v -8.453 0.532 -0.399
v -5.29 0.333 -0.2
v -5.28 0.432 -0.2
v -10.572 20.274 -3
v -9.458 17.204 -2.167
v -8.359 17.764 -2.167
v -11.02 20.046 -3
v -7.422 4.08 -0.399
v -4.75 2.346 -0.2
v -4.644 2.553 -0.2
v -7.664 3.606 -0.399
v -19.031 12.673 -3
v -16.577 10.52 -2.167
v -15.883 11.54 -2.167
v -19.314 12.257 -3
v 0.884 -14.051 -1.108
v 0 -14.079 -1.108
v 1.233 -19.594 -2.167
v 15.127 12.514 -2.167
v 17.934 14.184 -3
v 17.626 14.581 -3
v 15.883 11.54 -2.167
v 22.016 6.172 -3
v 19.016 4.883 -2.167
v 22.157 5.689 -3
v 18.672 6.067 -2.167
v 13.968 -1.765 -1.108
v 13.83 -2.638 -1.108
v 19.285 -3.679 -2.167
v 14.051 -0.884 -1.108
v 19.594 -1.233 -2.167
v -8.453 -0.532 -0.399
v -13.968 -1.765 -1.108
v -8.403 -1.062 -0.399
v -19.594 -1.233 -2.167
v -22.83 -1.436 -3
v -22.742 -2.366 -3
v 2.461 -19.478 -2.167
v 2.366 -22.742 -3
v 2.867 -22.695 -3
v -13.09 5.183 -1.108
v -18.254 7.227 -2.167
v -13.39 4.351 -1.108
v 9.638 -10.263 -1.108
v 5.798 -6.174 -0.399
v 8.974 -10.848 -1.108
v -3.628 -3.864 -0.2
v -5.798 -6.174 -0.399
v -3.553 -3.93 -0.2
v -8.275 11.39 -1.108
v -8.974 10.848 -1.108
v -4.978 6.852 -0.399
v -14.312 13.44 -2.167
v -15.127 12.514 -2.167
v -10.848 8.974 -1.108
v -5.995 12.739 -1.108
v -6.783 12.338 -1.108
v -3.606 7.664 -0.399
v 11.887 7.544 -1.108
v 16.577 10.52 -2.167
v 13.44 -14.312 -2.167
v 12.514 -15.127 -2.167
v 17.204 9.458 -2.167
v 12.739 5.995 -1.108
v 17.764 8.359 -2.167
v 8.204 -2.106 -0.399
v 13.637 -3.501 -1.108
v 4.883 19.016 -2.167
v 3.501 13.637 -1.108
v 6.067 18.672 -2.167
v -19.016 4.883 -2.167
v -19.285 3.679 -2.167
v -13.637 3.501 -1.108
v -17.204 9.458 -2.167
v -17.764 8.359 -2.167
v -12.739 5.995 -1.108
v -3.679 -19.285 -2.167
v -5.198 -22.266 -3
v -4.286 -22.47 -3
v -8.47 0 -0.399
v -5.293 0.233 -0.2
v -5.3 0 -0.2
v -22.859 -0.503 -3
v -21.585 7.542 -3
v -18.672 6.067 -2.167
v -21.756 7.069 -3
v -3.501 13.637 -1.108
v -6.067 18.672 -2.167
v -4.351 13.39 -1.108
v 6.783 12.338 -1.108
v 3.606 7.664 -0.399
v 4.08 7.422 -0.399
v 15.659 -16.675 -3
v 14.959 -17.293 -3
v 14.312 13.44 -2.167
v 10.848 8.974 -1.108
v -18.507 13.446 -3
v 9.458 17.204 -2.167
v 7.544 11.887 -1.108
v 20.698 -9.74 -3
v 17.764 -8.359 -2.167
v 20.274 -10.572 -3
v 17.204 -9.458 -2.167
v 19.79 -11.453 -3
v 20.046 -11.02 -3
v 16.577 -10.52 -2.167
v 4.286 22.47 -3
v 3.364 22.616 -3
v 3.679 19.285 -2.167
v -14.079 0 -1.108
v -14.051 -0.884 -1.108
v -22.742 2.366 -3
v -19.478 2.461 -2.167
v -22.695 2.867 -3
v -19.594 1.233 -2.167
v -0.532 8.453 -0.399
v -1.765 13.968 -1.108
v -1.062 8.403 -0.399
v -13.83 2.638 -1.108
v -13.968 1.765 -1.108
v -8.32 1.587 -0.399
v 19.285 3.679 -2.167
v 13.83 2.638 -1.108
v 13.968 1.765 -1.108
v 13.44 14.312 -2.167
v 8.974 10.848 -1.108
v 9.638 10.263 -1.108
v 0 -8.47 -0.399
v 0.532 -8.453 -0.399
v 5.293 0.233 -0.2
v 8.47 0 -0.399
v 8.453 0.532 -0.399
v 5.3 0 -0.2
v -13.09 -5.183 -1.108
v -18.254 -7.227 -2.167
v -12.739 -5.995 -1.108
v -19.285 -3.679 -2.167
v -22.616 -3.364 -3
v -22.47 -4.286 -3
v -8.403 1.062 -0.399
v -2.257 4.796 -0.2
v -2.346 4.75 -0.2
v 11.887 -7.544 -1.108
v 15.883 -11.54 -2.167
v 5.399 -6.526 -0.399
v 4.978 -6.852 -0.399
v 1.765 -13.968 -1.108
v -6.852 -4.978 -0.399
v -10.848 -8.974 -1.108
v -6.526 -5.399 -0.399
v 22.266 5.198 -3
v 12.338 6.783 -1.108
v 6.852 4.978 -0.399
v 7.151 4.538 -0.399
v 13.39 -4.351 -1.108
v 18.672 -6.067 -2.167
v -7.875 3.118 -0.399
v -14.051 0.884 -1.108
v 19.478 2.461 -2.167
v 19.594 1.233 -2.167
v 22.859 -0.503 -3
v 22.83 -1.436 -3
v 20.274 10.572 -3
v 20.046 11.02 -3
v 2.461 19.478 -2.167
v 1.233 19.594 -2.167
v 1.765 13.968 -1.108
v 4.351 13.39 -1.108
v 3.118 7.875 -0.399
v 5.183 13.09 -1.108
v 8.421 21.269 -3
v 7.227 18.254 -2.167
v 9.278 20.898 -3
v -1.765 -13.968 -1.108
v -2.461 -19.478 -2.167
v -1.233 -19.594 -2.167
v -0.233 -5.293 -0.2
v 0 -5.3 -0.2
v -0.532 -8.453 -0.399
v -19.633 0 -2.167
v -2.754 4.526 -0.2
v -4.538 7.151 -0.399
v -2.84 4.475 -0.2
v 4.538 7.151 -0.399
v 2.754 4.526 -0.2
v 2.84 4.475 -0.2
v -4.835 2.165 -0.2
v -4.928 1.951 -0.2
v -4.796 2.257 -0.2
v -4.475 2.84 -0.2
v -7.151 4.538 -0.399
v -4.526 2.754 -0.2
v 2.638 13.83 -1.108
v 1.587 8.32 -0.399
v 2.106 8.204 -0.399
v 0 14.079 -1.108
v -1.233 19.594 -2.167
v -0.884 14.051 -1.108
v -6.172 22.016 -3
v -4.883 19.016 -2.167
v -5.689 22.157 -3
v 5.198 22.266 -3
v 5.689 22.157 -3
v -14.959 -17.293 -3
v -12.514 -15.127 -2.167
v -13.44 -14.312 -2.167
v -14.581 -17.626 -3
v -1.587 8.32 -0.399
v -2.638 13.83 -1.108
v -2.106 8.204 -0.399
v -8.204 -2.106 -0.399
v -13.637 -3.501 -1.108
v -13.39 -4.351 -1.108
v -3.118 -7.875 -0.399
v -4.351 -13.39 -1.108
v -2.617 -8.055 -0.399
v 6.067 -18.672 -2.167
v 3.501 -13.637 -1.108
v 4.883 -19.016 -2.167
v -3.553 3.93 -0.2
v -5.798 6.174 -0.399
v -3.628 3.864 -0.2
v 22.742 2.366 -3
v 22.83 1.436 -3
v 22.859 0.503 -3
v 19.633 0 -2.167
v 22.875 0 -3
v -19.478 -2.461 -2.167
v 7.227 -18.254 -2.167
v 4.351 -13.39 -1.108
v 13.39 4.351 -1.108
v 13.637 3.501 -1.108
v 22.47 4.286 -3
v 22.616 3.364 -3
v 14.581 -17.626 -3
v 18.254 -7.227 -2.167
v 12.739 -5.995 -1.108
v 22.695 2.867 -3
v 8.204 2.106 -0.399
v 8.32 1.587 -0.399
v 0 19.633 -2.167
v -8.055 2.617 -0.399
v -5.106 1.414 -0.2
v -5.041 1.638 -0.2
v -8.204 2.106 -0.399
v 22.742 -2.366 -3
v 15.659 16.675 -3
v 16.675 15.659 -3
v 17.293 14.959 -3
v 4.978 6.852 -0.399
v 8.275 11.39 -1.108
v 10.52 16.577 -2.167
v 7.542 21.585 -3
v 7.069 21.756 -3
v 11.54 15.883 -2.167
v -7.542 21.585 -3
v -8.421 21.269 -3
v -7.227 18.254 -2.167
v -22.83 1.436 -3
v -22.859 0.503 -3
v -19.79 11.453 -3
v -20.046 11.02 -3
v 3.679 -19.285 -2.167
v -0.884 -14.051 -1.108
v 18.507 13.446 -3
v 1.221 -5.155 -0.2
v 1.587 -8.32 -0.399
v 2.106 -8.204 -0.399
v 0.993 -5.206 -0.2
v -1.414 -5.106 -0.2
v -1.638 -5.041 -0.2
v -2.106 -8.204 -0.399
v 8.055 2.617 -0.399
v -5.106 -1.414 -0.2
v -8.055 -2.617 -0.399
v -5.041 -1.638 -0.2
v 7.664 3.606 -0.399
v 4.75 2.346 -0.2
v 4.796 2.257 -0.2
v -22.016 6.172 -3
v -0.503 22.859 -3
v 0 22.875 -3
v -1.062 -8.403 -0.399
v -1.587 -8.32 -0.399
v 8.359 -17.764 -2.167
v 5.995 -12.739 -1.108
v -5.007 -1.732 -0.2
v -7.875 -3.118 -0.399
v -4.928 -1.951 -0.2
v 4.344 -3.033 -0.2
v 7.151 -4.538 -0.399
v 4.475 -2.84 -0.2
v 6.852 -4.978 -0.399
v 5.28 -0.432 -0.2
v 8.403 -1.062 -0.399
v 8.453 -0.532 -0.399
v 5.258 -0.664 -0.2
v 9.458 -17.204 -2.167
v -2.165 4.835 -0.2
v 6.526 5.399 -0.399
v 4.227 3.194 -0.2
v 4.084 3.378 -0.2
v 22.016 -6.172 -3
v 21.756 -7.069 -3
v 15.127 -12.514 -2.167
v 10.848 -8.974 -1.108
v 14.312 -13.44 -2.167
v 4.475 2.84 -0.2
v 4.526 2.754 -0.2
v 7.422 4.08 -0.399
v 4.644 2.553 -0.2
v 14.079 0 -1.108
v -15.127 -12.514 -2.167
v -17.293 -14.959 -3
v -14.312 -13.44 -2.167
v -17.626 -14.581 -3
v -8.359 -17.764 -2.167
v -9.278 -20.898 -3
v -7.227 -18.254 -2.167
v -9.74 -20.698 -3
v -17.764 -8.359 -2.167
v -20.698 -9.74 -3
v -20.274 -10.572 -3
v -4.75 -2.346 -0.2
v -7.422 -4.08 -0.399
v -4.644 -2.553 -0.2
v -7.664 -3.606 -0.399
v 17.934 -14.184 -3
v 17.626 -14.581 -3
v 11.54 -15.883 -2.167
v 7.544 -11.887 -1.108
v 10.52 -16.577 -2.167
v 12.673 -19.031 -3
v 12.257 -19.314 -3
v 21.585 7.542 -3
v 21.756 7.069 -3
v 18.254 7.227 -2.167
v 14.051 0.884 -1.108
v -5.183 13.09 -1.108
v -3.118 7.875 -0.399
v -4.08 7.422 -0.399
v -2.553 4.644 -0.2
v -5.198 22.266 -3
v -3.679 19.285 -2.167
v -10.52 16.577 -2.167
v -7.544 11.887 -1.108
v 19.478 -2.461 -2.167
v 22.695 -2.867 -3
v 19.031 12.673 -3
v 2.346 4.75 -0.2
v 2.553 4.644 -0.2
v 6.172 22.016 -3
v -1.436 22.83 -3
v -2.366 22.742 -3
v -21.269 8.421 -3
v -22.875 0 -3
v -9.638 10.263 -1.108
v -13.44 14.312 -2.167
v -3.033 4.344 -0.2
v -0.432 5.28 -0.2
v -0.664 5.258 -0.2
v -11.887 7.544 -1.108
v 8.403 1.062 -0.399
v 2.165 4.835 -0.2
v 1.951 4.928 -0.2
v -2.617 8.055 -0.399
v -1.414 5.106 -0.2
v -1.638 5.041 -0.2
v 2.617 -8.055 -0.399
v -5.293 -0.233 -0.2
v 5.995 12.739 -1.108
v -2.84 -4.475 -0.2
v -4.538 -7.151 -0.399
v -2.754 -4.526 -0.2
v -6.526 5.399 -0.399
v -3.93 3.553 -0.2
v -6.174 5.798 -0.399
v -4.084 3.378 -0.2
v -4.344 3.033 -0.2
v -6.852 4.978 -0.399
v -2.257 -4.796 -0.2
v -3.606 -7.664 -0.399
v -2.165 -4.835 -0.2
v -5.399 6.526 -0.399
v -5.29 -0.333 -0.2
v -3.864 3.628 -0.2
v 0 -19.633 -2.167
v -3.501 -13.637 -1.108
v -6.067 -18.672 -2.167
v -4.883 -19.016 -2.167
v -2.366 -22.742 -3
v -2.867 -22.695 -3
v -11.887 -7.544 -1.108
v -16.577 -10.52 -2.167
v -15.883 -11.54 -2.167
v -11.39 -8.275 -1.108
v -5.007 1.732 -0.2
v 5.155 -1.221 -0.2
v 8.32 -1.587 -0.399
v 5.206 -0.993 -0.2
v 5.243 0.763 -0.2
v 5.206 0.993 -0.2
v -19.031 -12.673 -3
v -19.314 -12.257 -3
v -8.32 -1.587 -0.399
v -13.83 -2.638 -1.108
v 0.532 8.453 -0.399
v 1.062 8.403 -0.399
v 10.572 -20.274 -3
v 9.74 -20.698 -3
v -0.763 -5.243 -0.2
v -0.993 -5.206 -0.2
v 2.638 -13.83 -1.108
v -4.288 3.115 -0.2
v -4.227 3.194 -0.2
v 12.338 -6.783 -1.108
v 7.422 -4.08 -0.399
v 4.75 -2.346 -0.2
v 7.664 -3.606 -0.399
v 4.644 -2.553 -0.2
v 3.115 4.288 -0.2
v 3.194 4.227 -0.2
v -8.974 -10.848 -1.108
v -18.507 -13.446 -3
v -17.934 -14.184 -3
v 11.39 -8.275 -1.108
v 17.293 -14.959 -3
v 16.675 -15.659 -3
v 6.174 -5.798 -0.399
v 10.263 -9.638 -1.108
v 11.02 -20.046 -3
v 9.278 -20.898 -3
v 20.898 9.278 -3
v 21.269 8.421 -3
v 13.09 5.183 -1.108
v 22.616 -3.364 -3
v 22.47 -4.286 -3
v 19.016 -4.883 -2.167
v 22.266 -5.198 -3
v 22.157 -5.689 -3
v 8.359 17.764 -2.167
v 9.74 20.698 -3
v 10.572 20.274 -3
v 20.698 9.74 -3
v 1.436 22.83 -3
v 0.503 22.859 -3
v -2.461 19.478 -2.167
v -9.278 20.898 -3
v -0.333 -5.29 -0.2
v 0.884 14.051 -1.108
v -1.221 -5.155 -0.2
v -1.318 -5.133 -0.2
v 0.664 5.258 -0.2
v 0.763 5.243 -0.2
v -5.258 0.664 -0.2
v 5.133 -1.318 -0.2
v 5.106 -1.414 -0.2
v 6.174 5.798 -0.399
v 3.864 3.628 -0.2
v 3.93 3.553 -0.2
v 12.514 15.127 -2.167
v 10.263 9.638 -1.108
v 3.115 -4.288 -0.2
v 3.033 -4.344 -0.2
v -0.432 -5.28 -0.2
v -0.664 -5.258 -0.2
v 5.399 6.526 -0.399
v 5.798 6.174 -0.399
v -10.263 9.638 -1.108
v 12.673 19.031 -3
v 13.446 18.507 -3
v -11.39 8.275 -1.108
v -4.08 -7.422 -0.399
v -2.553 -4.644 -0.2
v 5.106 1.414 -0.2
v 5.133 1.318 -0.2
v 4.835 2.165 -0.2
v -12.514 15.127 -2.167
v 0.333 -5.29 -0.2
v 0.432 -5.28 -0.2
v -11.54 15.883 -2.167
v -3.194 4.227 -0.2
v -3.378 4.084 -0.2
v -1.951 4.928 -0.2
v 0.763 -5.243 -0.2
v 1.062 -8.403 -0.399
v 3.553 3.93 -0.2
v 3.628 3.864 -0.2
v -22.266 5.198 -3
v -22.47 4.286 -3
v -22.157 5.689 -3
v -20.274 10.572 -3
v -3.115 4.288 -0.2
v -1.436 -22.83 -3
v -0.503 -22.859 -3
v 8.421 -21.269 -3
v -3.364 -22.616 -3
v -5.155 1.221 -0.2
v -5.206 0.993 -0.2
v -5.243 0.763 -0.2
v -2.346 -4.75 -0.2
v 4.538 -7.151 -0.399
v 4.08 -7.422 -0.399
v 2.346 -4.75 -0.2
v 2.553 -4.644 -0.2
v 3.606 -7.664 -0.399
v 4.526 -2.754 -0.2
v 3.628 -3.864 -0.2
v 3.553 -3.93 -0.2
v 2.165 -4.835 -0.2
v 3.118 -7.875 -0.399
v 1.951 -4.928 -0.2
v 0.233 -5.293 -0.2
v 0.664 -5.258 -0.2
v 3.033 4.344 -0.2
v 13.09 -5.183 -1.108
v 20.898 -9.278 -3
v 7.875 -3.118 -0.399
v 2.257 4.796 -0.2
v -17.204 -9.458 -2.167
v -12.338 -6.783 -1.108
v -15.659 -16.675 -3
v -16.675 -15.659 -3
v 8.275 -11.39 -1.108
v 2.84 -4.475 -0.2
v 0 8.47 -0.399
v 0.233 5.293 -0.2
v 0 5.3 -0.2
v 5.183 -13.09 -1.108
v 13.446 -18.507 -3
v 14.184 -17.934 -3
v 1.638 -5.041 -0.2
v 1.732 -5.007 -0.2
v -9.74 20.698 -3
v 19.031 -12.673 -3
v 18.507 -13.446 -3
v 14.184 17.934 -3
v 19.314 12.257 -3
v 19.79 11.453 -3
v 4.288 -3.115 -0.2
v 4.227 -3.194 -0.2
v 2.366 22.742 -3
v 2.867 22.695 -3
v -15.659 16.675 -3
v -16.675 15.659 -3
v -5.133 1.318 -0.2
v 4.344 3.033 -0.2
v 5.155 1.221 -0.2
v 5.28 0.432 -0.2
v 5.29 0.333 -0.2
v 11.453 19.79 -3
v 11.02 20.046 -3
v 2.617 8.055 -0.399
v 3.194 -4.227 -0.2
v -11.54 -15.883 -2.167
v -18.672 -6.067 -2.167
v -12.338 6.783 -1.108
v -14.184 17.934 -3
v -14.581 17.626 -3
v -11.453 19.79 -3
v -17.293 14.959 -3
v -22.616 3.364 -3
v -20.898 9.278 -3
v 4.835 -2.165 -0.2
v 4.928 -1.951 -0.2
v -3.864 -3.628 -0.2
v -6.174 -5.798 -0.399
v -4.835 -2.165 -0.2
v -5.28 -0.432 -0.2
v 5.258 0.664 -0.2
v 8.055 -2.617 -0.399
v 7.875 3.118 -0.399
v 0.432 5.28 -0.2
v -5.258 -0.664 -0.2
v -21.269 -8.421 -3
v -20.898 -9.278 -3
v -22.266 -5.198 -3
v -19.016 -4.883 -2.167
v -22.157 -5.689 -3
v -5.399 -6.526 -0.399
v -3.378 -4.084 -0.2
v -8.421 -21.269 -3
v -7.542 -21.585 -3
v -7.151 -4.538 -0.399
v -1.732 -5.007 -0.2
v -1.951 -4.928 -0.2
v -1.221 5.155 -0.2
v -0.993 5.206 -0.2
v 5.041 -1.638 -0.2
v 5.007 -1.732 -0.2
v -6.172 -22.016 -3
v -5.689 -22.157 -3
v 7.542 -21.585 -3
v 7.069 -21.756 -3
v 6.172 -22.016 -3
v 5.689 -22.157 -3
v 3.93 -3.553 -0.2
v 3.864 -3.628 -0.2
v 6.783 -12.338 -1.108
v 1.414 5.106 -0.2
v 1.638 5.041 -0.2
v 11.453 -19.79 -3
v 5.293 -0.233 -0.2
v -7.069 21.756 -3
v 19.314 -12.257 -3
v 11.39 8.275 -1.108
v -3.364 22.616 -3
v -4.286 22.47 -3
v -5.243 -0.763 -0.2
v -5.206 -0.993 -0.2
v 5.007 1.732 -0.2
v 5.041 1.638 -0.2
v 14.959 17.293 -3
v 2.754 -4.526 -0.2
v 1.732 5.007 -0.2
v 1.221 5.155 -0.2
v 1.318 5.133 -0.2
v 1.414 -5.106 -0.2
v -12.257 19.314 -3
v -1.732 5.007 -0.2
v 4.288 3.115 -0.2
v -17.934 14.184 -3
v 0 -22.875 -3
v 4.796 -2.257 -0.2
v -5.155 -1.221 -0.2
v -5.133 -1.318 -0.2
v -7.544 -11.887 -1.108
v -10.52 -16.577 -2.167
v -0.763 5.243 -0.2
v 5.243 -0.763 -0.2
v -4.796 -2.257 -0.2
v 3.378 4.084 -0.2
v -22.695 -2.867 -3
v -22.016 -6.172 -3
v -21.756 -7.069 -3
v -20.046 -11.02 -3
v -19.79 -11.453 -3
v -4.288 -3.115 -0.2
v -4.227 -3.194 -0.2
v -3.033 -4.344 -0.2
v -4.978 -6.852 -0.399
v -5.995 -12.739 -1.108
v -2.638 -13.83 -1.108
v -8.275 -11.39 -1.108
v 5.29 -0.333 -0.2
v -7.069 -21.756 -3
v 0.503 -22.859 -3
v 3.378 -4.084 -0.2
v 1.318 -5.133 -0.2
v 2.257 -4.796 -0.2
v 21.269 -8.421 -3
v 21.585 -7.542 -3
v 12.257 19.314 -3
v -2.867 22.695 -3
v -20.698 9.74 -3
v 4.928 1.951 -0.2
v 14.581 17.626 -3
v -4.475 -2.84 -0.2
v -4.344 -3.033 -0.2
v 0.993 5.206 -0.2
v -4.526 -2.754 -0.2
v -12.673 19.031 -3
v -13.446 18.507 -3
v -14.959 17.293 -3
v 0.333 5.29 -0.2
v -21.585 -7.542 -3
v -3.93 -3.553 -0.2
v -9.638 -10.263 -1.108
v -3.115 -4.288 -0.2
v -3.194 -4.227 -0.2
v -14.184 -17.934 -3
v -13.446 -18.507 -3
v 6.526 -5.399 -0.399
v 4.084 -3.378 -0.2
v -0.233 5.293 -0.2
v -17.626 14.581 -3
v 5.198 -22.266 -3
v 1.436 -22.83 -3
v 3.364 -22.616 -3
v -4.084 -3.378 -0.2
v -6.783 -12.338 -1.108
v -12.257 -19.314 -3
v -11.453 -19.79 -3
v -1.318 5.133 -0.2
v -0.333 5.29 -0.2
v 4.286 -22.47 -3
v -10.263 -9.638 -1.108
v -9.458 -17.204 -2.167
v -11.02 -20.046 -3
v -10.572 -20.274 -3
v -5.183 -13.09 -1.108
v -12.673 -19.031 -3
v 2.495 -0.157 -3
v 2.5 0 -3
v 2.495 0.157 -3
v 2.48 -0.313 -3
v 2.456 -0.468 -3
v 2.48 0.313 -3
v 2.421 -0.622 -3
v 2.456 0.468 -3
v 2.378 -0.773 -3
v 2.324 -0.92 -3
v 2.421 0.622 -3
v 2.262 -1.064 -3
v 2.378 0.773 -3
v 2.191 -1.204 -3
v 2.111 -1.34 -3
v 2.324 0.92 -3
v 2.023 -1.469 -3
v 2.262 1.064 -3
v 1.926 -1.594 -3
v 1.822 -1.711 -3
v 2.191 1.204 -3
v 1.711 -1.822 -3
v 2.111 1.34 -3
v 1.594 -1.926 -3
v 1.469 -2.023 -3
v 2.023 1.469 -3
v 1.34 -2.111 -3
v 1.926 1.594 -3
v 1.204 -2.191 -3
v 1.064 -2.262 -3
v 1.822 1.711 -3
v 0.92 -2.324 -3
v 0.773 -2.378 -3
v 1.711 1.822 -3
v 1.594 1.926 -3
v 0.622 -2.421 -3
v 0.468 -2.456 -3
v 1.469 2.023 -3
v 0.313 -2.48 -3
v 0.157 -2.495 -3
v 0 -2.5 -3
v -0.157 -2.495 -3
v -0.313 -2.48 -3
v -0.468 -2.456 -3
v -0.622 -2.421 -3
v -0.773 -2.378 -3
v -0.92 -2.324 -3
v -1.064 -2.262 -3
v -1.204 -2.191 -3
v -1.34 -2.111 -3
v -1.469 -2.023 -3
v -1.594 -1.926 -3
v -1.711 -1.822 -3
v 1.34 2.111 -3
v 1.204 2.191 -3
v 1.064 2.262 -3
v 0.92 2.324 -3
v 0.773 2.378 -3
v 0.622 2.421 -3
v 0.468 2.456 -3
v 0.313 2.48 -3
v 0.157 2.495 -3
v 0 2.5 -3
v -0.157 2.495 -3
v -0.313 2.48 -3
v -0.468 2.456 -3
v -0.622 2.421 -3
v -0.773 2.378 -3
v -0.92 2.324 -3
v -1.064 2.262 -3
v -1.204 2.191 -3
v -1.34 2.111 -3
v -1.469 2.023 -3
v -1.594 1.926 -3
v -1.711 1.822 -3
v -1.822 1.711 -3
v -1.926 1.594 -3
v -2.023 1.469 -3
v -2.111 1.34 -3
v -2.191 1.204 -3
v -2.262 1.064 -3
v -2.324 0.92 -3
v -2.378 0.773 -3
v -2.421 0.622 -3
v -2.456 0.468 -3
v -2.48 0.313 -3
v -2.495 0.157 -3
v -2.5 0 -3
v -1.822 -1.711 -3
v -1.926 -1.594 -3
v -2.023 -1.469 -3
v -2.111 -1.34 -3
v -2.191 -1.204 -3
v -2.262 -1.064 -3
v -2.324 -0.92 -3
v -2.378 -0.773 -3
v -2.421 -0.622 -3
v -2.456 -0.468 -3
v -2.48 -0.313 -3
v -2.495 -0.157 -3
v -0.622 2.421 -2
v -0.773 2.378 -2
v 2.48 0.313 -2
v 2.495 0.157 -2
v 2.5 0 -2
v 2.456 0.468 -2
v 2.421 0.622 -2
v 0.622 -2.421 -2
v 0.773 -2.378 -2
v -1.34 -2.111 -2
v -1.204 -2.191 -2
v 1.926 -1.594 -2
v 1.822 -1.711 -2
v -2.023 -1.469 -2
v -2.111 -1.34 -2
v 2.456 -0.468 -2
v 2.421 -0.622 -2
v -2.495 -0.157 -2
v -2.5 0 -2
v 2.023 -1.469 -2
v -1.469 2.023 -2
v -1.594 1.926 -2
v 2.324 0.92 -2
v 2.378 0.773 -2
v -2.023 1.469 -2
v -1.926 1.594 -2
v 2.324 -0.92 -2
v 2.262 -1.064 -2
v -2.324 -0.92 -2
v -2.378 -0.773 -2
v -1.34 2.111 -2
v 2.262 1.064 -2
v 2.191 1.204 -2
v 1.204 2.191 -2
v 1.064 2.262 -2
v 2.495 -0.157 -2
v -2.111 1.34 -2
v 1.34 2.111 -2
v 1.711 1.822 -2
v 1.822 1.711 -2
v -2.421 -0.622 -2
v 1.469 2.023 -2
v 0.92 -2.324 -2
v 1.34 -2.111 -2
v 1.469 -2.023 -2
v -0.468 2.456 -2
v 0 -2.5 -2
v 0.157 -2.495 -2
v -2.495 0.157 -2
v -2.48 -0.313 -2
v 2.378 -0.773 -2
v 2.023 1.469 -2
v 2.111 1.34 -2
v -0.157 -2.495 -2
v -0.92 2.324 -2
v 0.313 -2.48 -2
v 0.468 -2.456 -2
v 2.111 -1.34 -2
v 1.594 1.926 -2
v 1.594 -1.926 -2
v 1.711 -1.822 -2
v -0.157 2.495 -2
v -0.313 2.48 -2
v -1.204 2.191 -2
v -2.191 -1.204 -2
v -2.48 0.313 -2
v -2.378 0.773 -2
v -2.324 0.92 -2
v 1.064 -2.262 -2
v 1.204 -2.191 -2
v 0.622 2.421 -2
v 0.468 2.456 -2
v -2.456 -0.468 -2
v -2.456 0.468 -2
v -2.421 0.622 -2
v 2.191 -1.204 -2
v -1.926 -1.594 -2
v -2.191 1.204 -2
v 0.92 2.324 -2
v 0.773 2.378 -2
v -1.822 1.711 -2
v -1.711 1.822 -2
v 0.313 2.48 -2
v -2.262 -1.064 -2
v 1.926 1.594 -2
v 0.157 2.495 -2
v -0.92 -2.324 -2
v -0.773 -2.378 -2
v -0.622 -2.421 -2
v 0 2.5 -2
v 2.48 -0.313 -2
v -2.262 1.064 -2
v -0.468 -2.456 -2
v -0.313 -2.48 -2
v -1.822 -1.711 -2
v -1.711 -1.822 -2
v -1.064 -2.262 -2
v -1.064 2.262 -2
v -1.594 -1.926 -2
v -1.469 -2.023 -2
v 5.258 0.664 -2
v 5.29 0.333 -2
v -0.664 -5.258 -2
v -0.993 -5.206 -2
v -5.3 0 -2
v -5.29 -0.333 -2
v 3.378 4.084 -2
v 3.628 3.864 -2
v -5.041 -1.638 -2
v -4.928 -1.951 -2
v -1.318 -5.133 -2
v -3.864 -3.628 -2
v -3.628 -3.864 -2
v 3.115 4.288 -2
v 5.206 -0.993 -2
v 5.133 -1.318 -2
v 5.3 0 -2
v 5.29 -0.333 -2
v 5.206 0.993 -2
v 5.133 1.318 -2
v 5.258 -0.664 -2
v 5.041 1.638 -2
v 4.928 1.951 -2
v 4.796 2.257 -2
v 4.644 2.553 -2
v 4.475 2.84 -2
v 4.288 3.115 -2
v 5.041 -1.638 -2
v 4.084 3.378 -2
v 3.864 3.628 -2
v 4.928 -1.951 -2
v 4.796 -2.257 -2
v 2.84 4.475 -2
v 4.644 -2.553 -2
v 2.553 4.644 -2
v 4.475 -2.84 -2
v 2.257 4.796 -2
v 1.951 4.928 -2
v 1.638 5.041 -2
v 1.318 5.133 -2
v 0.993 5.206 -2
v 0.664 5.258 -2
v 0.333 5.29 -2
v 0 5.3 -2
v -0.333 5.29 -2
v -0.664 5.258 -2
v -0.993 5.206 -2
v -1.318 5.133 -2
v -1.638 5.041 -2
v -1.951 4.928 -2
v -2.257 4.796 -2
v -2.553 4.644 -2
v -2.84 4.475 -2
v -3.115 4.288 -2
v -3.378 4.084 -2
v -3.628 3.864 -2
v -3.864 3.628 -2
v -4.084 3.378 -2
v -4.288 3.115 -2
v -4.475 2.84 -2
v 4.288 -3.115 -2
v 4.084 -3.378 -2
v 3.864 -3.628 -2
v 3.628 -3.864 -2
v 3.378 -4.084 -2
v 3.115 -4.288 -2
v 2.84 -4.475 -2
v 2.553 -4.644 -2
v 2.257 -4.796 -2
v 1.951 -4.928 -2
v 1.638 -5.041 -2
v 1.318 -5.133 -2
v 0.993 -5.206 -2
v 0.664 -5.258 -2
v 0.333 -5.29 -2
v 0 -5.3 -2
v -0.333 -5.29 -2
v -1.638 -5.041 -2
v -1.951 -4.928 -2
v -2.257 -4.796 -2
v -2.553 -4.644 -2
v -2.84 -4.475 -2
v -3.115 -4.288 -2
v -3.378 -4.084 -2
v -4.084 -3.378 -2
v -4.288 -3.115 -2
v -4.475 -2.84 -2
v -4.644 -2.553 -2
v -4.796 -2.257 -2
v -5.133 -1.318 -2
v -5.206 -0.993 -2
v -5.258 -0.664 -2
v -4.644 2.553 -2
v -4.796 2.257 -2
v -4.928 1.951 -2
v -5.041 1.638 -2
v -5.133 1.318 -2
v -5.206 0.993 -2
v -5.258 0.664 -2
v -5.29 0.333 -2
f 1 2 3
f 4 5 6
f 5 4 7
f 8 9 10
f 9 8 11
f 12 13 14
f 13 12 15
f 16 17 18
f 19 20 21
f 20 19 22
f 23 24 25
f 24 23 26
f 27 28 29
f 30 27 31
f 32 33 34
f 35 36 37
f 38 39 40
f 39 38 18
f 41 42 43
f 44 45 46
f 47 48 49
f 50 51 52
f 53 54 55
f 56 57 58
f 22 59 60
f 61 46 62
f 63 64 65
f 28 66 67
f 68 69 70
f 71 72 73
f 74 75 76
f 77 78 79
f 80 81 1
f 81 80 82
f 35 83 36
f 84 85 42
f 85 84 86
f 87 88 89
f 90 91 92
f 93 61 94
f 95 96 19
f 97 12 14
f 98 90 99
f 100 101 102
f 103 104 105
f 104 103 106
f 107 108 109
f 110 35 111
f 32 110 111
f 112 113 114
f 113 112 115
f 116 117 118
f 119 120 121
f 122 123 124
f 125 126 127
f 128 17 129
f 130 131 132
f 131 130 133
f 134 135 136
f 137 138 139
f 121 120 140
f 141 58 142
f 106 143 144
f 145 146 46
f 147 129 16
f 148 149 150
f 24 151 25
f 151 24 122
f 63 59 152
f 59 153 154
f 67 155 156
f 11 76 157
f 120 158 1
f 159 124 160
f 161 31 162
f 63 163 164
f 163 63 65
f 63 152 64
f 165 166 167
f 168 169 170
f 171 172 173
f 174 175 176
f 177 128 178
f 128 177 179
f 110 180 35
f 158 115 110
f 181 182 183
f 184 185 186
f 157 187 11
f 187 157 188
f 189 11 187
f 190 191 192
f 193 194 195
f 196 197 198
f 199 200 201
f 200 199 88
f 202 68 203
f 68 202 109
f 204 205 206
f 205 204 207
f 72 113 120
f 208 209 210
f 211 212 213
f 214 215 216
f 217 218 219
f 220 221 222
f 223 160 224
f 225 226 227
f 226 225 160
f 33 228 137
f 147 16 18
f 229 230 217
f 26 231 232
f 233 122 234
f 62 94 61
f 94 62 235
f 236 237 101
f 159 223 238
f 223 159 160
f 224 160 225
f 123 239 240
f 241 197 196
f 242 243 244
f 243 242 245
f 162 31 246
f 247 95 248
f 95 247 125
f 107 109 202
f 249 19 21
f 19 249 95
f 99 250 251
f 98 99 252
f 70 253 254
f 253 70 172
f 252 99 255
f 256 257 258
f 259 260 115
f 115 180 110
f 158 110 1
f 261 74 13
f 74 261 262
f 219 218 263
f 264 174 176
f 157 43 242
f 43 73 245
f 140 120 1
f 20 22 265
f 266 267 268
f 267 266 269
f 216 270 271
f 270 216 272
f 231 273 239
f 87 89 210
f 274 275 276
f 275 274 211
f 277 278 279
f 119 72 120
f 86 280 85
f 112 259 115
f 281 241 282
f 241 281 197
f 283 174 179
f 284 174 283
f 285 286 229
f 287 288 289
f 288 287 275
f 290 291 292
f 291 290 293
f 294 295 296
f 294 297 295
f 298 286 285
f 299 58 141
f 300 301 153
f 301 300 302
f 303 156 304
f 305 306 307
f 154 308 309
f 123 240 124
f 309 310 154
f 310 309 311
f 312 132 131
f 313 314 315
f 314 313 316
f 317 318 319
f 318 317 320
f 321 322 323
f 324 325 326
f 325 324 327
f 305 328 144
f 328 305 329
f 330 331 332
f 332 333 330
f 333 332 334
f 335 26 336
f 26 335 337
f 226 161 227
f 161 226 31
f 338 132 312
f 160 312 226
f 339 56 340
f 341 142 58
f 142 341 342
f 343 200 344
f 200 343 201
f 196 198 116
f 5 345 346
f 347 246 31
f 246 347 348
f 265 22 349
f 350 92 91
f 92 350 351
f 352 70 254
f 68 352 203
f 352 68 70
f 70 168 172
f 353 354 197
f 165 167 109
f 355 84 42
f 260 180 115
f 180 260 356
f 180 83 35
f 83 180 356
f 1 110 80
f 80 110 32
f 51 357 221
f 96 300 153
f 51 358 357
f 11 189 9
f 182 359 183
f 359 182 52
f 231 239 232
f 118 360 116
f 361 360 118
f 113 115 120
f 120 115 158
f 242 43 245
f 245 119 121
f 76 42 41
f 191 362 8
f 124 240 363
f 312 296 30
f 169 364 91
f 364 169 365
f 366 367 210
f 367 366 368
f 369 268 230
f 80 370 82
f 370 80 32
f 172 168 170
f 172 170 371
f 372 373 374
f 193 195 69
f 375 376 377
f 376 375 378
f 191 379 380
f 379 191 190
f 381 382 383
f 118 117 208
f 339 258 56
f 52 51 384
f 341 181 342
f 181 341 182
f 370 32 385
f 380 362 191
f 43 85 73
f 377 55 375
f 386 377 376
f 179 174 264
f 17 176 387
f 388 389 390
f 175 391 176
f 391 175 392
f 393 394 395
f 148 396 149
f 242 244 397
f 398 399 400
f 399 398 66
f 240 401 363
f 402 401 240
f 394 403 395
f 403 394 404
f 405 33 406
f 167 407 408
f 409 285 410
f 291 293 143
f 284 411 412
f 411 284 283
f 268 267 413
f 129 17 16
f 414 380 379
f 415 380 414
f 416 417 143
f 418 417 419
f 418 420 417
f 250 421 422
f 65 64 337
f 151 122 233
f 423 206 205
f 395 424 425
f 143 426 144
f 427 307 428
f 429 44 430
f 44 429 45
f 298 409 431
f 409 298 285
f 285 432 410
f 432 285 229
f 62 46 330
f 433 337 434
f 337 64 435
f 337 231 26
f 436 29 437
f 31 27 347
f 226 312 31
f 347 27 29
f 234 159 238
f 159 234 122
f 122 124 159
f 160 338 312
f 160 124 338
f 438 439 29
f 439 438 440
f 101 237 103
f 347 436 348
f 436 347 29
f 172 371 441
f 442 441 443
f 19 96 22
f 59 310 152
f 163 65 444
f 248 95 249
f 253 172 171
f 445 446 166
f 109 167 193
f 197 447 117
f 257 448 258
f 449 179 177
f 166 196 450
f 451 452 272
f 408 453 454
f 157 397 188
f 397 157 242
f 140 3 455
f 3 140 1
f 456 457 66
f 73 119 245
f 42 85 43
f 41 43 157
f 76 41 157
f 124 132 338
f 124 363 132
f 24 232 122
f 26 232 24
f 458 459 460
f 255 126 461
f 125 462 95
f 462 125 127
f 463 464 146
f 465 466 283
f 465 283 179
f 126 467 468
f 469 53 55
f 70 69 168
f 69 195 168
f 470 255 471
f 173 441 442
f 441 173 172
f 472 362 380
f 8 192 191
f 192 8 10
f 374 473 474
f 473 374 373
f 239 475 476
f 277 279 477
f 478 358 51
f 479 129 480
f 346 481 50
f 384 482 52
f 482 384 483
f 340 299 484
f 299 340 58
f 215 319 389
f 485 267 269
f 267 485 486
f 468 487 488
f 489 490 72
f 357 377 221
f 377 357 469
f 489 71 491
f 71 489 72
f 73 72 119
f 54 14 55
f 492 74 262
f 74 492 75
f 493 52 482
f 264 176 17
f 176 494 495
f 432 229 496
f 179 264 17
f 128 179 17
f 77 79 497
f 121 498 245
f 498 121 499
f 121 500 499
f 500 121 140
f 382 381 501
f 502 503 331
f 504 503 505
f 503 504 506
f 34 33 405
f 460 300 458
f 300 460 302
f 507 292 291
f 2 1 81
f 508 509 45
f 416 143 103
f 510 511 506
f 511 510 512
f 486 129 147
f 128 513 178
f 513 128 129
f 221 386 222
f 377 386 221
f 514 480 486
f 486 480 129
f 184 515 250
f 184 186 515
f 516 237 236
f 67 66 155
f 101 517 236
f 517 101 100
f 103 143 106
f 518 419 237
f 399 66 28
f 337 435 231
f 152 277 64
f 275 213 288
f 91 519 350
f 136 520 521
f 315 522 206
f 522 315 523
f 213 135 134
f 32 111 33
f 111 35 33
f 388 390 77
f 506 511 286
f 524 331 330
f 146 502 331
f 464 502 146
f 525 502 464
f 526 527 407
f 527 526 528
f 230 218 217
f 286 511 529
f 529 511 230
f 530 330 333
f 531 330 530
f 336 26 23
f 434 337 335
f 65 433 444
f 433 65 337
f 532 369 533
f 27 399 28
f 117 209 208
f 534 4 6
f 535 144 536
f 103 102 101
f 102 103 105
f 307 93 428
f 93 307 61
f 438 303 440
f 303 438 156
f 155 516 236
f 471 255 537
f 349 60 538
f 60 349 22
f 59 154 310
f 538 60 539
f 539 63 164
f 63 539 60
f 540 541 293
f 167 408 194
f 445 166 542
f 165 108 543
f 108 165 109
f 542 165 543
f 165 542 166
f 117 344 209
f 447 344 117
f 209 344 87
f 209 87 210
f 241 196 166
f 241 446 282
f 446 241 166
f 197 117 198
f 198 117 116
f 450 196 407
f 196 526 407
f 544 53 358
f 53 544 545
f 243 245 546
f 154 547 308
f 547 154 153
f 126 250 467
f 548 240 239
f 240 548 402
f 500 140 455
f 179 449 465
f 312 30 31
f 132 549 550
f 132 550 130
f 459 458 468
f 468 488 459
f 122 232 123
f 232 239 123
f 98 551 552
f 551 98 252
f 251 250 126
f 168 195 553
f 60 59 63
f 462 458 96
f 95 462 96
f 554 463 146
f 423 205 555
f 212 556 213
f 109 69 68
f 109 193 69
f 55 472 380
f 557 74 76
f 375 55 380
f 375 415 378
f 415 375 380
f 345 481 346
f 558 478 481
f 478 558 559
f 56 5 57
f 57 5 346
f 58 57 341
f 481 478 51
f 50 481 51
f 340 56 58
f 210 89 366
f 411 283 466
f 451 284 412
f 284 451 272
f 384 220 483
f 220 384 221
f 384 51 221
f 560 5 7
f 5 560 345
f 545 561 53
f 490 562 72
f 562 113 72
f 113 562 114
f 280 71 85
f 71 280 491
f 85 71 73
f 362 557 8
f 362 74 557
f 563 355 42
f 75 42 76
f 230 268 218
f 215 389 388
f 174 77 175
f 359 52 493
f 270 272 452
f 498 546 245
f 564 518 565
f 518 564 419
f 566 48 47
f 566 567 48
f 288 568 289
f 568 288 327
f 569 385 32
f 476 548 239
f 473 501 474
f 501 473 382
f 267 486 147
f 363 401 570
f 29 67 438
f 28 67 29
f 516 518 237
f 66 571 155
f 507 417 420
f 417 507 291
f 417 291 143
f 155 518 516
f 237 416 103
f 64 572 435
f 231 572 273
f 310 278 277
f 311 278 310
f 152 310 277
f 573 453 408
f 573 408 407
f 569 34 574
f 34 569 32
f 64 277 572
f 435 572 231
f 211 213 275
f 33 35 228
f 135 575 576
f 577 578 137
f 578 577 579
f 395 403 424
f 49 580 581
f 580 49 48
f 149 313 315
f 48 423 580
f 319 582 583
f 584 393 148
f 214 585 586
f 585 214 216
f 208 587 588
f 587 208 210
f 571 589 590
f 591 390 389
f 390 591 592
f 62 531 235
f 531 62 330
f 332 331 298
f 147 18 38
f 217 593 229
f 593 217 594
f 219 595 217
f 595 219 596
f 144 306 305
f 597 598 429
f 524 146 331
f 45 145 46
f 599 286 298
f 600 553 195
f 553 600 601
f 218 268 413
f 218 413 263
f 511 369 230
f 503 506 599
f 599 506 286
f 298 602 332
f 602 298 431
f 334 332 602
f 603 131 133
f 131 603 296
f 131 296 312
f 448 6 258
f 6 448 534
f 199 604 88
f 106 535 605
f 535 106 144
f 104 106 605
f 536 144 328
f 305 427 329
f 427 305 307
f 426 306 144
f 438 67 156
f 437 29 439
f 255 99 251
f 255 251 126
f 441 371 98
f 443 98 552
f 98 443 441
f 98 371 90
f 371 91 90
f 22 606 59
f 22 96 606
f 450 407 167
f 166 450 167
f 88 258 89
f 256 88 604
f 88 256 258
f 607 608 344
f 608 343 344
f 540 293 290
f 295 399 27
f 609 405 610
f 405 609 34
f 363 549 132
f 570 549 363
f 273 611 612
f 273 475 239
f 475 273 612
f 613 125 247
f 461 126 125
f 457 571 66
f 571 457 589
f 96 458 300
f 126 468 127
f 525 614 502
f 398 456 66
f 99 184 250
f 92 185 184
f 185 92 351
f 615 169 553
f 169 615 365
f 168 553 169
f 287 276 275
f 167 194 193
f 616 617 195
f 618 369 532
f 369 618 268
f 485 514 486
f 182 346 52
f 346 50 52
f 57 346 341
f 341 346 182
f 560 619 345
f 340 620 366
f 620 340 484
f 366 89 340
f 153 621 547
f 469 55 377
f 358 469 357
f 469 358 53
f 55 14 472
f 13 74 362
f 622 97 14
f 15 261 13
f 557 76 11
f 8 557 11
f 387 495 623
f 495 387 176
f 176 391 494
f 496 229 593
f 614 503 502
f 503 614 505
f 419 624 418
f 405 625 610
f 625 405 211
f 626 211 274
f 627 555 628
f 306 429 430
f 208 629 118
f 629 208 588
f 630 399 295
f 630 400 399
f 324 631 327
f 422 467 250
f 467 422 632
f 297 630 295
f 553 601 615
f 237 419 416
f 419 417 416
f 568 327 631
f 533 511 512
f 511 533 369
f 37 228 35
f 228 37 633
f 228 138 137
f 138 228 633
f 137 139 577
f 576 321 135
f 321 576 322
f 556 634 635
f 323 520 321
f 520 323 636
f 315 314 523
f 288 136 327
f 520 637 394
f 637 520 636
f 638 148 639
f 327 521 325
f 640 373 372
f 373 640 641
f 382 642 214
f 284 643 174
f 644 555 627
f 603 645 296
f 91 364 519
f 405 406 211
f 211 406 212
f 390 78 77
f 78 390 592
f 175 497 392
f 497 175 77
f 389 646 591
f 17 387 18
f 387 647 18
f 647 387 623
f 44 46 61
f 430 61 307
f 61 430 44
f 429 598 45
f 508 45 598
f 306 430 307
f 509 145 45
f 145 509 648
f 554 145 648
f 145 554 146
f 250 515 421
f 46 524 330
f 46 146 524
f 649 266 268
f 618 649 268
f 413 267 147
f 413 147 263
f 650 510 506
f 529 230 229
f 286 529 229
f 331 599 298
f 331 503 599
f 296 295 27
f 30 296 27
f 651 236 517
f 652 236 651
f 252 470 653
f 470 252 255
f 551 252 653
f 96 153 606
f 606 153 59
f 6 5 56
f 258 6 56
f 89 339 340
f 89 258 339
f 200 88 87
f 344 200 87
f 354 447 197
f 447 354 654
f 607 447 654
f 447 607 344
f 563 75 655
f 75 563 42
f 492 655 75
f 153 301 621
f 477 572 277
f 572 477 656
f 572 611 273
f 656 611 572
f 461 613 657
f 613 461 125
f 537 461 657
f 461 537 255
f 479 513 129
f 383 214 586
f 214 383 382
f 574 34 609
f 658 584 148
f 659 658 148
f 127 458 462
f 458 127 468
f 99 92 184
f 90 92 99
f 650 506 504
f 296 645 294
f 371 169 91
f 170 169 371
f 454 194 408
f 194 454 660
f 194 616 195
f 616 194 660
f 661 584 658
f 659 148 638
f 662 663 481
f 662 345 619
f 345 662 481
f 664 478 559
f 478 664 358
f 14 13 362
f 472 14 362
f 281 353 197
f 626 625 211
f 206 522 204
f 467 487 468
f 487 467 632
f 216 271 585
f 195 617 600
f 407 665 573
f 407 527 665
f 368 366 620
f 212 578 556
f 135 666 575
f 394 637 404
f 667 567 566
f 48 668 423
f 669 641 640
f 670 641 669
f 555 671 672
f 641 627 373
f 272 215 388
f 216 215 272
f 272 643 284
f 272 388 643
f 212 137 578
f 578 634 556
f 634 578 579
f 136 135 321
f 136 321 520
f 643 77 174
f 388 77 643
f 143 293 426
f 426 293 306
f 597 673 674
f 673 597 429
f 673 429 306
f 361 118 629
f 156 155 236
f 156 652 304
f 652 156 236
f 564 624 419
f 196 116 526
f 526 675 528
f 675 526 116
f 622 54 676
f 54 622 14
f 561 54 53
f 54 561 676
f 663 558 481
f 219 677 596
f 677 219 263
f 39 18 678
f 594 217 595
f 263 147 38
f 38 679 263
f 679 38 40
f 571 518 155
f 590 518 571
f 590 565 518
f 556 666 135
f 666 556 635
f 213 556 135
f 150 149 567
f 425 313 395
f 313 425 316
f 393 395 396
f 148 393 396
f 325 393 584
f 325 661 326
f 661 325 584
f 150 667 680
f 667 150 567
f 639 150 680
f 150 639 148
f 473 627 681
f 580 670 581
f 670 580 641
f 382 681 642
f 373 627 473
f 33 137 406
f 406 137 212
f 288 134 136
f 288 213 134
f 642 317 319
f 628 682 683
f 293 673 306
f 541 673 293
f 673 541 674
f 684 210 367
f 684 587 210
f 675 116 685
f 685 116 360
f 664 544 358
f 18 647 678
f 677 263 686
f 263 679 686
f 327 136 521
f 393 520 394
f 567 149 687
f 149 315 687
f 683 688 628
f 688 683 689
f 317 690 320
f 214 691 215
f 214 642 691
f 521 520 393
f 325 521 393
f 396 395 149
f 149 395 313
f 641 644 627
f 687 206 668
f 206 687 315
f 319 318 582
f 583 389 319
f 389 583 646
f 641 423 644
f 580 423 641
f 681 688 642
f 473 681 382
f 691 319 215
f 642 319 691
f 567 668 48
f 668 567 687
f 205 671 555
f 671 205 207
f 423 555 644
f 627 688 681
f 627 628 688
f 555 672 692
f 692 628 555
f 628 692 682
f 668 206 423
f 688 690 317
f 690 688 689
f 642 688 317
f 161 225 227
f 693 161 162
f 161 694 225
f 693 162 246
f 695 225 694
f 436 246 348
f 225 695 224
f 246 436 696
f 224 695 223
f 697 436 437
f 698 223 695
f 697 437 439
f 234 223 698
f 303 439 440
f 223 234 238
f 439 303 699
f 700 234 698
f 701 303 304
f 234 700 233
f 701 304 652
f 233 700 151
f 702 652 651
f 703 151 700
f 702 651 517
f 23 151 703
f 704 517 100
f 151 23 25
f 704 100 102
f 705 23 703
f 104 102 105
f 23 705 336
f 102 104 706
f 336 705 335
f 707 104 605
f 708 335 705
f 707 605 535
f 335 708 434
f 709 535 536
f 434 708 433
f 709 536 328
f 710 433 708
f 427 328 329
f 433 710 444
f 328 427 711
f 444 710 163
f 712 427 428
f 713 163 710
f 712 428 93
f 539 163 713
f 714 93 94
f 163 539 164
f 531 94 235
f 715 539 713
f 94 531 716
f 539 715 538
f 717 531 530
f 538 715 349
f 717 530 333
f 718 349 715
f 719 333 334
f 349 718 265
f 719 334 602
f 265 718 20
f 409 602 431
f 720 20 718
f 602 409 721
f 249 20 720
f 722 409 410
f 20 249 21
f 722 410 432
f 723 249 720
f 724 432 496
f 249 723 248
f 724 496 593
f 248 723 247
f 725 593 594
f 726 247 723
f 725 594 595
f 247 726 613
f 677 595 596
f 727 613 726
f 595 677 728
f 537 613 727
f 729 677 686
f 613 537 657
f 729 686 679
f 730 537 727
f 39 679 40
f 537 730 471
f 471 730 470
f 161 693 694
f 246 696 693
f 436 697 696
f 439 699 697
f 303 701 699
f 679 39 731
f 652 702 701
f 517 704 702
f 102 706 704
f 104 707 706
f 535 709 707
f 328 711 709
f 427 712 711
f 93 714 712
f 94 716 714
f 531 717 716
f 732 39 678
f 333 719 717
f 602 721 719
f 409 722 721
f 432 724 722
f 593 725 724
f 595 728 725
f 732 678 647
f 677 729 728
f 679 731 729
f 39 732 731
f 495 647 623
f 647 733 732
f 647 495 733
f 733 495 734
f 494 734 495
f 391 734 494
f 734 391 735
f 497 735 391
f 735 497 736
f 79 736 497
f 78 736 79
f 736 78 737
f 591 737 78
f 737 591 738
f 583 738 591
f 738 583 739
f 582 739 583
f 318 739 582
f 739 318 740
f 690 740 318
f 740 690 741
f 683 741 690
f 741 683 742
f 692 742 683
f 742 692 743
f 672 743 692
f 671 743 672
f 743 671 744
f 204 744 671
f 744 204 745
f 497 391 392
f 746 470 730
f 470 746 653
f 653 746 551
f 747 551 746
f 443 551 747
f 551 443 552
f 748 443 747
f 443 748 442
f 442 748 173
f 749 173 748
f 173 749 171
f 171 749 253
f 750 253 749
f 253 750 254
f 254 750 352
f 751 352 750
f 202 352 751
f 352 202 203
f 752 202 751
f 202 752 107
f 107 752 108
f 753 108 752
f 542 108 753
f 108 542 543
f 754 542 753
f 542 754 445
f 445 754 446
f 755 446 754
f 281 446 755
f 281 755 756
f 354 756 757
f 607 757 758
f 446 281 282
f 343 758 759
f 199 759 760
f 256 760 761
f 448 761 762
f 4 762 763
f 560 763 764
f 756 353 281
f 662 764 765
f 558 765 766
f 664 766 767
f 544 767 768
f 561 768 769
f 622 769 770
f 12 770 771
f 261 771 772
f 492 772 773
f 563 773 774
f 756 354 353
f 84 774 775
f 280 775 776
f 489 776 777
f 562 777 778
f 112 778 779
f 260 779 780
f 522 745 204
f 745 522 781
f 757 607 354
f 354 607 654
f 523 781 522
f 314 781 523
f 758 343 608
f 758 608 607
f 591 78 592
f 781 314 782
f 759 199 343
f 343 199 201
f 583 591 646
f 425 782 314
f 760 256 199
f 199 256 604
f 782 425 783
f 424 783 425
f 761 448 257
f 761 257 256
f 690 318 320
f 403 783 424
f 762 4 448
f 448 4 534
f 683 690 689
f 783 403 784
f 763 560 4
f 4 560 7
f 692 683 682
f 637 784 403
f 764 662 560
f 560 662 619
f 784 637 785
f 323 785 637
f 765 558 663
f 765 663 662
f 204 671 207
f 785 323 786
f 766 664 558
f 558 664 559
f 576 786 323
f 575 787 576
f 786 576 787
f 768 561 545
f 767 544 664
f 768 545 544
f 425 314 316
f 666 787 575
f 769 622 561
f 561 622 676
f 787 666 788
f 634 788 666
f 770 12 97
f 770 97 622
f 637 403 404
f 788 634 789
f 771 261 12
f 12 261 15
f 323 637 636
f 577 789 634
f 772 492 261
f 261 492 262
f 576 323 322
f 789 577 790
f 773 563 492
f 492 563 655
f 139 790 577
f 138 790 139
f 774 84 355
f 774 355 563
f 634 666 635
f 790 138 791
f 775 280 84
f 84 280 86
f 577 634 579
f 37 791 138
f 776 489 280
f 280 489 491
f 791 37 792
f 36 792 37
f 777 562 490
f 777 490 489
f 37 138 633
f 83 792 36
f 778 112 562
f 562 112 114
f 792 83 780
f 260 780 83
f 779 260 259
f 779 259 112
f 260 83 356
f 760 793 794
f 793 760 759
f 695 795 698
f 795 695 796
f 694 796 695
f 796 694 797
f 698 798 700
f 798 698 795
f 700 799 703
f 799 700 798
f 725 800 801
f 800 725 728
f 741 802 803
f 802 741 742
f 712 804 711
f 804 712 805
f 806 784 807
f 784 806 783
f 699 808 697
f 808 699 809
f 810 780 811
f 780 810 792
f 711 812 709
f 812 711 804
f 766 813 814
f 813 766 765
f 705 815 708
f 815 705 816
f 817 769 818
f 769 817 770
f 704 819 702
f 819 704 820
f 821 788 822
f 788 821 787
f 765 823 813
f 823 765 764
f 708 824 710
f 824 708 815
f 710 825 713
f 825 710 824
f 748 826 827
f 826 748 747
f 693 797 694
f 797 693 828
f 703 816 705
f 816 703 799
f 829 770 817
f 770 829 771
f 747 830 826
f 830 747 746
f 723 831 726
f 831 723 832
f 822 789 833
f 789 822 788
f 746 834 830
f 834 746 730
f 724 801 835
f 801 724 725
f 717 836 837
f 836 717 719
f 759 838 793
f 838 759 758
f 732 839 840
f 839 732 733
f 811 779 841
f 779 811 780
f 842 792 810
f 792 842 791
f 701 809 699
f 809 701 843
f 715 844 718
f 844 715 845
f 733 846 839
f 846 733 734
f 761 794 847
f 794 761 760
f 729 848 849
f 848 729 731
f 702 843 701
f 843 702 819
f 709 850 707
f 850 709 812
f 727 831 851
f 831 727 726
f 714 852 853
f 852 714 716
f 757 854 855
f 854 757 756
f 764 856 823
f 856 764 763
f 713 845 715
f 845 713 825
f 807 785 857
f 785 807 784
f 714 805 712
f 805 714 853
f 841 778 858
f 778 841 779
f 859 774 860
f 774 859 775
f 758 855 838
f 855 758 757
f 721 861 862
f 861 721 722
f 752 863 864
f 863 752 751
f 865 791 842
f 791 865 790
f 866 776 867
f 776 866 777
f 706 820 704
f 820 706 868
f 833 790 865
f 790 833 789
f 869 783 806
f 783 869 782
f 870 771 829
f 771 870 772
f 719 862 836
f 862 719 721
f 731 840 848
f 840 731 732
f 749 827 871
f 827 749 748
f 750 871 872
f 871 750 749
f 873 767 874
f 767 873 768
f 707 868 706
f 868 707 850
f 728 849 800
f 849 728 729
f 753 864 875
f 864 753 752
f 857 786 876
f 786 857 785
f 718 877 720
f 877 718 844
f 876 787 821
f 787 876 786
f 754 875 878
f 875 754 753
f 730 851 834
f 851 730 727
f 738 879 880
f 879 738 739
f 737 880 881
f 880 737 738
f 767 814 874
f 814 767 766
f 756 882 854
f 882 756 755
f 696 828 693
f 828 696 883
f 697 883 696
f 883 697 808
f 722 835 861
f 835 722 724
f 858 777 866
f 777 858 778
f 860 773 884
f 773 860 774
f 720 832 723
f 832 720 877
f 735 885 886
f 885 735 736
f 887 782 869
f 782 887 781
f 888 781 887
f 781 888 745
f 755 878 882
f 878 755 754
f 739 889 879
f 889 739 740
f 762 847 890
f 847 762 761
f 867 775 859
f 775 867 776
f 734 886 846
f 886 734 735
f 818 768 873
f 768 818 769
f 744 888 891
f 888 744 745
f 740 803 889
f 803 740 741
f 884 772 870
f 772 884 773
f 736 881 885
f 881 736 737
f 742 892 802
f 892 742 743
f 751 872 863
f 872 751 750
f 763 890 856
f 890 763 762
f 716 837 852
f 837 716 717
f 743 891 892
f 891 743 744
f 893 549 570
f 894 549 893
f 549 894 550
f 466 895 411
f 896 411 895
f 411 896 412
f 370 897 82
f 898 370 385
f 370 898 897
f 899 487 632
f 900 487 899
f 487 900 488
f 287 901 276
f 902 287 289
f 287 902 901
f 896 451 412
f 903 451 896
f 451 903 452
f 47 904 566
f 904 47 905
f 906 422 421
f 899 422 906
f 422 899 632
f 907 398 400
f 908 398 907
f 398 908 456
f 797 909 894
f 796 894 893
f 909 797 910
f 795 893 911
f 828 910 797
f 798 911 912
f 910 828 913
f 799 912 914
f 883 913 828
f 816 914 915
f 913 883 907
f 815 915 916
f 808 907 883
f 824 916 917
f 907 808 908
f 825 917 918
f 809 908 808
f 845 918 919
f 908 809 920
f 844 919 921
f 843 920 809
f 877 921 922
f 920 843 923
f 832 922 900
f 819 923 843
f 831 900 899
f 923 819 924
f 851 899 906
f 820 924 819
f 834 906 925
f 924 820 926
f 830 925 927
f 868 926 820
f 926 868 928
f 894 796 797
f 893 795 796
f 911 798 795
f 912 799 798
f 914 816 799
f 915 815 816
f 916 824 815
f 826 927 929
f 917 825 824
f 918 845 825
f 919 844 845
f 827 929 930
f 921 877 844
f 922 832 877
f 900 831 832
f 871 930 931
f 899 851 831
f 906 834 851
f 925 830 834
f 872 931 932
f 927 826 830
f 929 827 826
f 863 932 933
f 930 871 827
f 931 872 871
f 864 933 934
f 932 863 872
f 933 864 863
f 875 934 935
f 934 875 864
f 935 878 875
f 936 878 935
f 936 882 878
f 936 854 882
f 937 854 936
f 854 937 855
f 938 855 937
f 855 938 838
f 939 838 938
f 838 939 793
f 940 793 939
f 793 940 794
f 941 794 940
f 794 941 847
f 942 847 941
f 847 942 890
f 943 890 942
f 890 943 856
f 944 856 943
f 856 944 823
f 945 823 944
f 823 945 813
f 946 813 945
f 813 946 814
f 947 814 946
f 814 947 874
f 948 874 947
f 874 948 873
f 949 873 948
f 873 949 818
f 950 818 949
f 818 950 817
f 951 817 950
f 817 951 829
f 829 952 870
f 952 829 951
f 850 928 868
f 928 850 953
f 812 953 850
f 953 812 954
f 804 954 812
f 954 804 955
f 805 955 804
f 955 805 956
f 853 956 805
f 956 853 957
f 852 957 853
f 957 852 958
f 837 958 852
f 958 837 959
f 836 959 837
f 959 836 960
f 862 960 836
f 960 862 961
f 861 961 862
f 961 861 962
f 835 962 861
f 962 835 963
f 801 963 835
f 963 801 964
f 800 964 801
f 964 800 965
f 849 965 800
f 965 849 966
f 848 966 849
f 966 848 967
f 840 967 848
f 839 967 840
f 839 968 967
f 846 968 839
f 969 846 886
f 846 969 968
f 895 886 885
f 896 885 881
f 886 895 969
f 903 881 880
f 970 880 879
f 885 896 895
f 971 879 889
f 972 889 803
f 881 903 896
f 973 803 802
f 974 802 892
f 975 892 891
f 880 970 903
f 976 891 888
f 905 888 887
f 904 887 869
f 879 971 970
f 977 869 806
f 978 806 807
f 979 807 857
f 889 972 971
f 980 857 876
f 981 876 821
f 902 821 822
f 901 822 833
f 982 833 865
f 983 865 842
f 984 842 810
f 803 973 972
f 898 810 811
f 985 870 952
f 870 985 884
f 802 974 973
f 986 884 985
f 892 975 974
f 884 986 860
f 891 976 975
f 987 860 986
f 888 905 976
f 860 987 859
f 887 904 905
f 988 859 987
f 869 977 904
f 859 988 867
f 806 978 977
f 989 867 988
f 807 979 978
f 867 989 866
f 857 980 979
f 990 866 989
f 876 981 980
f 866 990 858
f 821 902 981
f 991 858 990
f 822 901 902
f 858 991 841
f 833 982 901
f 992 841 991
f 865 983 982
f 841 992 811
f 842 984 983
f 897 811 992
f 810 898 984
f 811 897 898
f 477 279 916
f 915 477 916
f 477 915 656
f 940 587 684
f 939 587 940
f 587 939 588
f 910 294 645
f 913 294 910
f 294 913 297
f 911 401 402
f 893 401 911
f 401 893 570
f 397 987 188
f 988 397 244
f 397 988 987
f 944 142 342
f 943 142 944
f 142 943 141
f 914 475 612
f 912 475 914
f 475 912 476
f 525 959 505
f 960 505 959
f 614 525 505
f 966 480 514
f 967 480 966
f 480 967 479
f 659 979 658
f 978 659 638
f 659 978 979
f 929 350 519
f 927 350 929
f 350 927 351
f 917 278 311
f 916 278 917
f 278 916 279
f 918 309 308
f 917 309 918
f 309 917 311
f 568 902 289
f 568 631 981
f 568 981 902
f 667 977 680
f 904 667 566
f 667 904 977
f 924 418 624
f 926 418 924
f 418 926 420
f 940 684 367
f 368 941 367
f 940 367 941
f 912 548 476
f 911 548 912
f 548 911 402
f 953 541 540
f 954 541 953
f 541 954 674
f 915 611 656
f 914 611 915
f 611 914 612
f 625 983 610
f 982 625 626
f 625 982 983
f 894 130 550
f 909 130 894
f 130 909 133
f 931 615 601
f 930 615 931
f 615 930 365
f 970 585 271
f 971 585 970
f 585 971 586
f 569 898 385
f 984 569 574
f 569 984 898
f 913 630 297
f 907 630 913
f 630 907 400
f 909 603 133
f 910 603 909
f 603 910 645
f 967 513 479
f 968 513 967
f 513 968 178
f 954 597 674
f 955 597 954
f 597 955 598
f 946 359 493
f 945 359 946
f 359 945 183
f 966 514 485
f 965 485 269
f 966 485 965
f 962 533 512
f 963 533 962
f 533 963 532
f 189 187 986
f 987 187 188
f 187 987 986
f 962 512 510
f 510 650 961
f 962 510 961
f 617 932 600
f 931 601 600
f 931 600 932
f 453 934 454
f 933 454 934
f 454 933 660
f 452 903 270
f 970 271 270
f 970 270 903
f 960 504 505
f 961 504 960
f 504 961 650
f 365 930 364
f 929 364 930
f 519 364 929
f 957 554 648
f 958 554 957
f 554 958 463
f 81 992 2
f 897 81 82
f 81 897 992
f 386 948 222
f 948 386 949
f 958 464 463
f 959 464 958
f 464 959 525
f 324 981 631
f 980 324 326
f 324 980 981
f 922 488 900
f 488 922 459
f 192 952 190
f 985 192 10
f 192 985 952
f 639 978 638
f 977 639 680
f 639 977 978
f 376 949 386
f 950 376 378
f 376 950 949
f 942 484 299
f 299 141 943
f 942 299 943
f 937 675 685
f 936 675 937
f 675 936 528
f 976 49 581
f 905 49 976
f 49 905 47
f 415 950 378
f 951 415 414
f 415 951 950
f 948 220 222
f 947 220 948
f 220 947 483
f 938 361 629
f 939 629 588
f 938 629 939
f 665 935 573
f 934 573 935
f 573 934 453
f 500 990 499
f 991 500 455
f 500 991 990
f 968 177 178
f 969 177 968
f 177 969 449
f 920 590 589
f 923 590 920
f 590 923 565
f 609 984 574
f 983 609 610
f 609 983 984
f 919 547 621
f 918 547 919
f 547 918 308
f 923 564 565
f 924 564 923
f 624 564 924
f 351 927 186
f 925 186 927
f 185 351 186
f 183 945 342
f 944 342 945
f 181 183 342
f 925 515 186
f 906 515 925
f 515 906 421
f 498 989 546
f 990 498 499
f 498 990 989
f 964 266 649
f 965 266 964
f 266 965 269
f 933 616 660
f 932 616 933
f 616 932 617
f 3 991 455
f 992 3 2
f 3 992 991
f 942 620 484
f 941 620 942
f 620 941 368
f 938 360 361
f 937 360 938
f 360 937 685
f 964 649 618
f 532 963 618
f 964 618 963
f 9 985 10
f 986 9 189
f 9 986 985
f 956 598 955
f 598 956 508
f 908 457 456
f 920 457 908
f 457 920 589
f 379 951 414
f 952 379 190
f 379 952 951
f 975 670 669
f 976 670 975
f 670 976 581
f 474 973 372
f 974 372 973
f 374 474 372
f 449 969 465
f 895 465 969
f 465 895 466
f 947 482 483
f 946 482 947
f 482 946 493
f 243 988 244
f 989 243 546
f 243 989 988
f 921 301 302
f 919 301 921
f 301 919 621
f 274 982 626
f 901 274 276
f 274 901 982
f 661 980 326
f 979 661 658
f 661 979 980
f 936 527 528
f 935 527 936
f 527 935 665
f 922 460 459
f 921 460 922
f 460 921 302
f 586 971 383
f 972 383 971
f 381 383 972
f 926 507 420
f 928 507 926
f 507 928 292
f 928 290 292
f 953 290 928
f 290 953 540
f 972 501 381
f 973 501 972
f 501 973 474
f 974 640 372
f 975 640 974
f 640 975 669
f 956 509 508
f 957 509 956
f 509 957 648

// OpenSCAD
/**
   mulit-size upholstery screw-in button
   
   Source: https://github.com/KiwiKid/openscaden/
   Author: KiwiKid
   
*/

$fn = 100;



// Size of the screw hole
screw_hole_radius_size = 2.5;
// Size of gap for screw head
screw_head_hole_radius_size = 5.3; //max(screw_hole_radius_size*1.5, 5);

// The gap between the bottom of the button and the screw hole
screw_hole_guard_depth = 1;

// Controls the 'height' of the button
button_height =5;
// Controls the amount of 'curve' in the button
button_radius = 90;

// Control how thick/proud the button is
button_width = 3;

cube_side_length = button_radius*4;
cube_size = [cube_side_length, cube_side_length, cube_side_length];

all_the_way = 1000;

optional_part_id_letter = "";


// Will be populated by openscadgen
module label_text(txt) {
    if (!is_undef(txt)) {
     
        text_size = 3;  // Size of the text
        text_height = 3; // Height of the extruded text
        text_y_translate = screw_head_hole_radius_size+1;
        text_depth = 0.8;
        
        // Estimate width of each character
        char_width = text_size * 0.94;

        // Get the number of characters in the text
        total_width = len(txt) * char_width;

        // Center the text on the X-axis by adjusting the translate value
        translate([-total_width / 2, text_y_translate, -button_width+text_depth])
        rotate([180, 0, 0])
        linear_extrude(height =text_height)
        text(txt, size = text_size, font = "Liberation Sans:style=Bold");
    }
}

difference(){

    translate([0, 0, -button_radius-5+button_height])
    sphere(button_radius);
        
    translate([-cube_side_length+button_radius, -button_radius, -cube_size[2]-button_width])
    cube(cube_size);
    
    
    translate([0, 0, -100])
    cylinder(h=all_the_way, r = screw_hole_radius_size);
    
    translate([0, 0, screw_hole_guard_depth-button_width])
    cylinder(h=all_the_way, r = screw_head_hole_radius_size);
    
    
    
  
    // (optional) part label to help with identification
    label_text(optional_part_id_letter);


}
